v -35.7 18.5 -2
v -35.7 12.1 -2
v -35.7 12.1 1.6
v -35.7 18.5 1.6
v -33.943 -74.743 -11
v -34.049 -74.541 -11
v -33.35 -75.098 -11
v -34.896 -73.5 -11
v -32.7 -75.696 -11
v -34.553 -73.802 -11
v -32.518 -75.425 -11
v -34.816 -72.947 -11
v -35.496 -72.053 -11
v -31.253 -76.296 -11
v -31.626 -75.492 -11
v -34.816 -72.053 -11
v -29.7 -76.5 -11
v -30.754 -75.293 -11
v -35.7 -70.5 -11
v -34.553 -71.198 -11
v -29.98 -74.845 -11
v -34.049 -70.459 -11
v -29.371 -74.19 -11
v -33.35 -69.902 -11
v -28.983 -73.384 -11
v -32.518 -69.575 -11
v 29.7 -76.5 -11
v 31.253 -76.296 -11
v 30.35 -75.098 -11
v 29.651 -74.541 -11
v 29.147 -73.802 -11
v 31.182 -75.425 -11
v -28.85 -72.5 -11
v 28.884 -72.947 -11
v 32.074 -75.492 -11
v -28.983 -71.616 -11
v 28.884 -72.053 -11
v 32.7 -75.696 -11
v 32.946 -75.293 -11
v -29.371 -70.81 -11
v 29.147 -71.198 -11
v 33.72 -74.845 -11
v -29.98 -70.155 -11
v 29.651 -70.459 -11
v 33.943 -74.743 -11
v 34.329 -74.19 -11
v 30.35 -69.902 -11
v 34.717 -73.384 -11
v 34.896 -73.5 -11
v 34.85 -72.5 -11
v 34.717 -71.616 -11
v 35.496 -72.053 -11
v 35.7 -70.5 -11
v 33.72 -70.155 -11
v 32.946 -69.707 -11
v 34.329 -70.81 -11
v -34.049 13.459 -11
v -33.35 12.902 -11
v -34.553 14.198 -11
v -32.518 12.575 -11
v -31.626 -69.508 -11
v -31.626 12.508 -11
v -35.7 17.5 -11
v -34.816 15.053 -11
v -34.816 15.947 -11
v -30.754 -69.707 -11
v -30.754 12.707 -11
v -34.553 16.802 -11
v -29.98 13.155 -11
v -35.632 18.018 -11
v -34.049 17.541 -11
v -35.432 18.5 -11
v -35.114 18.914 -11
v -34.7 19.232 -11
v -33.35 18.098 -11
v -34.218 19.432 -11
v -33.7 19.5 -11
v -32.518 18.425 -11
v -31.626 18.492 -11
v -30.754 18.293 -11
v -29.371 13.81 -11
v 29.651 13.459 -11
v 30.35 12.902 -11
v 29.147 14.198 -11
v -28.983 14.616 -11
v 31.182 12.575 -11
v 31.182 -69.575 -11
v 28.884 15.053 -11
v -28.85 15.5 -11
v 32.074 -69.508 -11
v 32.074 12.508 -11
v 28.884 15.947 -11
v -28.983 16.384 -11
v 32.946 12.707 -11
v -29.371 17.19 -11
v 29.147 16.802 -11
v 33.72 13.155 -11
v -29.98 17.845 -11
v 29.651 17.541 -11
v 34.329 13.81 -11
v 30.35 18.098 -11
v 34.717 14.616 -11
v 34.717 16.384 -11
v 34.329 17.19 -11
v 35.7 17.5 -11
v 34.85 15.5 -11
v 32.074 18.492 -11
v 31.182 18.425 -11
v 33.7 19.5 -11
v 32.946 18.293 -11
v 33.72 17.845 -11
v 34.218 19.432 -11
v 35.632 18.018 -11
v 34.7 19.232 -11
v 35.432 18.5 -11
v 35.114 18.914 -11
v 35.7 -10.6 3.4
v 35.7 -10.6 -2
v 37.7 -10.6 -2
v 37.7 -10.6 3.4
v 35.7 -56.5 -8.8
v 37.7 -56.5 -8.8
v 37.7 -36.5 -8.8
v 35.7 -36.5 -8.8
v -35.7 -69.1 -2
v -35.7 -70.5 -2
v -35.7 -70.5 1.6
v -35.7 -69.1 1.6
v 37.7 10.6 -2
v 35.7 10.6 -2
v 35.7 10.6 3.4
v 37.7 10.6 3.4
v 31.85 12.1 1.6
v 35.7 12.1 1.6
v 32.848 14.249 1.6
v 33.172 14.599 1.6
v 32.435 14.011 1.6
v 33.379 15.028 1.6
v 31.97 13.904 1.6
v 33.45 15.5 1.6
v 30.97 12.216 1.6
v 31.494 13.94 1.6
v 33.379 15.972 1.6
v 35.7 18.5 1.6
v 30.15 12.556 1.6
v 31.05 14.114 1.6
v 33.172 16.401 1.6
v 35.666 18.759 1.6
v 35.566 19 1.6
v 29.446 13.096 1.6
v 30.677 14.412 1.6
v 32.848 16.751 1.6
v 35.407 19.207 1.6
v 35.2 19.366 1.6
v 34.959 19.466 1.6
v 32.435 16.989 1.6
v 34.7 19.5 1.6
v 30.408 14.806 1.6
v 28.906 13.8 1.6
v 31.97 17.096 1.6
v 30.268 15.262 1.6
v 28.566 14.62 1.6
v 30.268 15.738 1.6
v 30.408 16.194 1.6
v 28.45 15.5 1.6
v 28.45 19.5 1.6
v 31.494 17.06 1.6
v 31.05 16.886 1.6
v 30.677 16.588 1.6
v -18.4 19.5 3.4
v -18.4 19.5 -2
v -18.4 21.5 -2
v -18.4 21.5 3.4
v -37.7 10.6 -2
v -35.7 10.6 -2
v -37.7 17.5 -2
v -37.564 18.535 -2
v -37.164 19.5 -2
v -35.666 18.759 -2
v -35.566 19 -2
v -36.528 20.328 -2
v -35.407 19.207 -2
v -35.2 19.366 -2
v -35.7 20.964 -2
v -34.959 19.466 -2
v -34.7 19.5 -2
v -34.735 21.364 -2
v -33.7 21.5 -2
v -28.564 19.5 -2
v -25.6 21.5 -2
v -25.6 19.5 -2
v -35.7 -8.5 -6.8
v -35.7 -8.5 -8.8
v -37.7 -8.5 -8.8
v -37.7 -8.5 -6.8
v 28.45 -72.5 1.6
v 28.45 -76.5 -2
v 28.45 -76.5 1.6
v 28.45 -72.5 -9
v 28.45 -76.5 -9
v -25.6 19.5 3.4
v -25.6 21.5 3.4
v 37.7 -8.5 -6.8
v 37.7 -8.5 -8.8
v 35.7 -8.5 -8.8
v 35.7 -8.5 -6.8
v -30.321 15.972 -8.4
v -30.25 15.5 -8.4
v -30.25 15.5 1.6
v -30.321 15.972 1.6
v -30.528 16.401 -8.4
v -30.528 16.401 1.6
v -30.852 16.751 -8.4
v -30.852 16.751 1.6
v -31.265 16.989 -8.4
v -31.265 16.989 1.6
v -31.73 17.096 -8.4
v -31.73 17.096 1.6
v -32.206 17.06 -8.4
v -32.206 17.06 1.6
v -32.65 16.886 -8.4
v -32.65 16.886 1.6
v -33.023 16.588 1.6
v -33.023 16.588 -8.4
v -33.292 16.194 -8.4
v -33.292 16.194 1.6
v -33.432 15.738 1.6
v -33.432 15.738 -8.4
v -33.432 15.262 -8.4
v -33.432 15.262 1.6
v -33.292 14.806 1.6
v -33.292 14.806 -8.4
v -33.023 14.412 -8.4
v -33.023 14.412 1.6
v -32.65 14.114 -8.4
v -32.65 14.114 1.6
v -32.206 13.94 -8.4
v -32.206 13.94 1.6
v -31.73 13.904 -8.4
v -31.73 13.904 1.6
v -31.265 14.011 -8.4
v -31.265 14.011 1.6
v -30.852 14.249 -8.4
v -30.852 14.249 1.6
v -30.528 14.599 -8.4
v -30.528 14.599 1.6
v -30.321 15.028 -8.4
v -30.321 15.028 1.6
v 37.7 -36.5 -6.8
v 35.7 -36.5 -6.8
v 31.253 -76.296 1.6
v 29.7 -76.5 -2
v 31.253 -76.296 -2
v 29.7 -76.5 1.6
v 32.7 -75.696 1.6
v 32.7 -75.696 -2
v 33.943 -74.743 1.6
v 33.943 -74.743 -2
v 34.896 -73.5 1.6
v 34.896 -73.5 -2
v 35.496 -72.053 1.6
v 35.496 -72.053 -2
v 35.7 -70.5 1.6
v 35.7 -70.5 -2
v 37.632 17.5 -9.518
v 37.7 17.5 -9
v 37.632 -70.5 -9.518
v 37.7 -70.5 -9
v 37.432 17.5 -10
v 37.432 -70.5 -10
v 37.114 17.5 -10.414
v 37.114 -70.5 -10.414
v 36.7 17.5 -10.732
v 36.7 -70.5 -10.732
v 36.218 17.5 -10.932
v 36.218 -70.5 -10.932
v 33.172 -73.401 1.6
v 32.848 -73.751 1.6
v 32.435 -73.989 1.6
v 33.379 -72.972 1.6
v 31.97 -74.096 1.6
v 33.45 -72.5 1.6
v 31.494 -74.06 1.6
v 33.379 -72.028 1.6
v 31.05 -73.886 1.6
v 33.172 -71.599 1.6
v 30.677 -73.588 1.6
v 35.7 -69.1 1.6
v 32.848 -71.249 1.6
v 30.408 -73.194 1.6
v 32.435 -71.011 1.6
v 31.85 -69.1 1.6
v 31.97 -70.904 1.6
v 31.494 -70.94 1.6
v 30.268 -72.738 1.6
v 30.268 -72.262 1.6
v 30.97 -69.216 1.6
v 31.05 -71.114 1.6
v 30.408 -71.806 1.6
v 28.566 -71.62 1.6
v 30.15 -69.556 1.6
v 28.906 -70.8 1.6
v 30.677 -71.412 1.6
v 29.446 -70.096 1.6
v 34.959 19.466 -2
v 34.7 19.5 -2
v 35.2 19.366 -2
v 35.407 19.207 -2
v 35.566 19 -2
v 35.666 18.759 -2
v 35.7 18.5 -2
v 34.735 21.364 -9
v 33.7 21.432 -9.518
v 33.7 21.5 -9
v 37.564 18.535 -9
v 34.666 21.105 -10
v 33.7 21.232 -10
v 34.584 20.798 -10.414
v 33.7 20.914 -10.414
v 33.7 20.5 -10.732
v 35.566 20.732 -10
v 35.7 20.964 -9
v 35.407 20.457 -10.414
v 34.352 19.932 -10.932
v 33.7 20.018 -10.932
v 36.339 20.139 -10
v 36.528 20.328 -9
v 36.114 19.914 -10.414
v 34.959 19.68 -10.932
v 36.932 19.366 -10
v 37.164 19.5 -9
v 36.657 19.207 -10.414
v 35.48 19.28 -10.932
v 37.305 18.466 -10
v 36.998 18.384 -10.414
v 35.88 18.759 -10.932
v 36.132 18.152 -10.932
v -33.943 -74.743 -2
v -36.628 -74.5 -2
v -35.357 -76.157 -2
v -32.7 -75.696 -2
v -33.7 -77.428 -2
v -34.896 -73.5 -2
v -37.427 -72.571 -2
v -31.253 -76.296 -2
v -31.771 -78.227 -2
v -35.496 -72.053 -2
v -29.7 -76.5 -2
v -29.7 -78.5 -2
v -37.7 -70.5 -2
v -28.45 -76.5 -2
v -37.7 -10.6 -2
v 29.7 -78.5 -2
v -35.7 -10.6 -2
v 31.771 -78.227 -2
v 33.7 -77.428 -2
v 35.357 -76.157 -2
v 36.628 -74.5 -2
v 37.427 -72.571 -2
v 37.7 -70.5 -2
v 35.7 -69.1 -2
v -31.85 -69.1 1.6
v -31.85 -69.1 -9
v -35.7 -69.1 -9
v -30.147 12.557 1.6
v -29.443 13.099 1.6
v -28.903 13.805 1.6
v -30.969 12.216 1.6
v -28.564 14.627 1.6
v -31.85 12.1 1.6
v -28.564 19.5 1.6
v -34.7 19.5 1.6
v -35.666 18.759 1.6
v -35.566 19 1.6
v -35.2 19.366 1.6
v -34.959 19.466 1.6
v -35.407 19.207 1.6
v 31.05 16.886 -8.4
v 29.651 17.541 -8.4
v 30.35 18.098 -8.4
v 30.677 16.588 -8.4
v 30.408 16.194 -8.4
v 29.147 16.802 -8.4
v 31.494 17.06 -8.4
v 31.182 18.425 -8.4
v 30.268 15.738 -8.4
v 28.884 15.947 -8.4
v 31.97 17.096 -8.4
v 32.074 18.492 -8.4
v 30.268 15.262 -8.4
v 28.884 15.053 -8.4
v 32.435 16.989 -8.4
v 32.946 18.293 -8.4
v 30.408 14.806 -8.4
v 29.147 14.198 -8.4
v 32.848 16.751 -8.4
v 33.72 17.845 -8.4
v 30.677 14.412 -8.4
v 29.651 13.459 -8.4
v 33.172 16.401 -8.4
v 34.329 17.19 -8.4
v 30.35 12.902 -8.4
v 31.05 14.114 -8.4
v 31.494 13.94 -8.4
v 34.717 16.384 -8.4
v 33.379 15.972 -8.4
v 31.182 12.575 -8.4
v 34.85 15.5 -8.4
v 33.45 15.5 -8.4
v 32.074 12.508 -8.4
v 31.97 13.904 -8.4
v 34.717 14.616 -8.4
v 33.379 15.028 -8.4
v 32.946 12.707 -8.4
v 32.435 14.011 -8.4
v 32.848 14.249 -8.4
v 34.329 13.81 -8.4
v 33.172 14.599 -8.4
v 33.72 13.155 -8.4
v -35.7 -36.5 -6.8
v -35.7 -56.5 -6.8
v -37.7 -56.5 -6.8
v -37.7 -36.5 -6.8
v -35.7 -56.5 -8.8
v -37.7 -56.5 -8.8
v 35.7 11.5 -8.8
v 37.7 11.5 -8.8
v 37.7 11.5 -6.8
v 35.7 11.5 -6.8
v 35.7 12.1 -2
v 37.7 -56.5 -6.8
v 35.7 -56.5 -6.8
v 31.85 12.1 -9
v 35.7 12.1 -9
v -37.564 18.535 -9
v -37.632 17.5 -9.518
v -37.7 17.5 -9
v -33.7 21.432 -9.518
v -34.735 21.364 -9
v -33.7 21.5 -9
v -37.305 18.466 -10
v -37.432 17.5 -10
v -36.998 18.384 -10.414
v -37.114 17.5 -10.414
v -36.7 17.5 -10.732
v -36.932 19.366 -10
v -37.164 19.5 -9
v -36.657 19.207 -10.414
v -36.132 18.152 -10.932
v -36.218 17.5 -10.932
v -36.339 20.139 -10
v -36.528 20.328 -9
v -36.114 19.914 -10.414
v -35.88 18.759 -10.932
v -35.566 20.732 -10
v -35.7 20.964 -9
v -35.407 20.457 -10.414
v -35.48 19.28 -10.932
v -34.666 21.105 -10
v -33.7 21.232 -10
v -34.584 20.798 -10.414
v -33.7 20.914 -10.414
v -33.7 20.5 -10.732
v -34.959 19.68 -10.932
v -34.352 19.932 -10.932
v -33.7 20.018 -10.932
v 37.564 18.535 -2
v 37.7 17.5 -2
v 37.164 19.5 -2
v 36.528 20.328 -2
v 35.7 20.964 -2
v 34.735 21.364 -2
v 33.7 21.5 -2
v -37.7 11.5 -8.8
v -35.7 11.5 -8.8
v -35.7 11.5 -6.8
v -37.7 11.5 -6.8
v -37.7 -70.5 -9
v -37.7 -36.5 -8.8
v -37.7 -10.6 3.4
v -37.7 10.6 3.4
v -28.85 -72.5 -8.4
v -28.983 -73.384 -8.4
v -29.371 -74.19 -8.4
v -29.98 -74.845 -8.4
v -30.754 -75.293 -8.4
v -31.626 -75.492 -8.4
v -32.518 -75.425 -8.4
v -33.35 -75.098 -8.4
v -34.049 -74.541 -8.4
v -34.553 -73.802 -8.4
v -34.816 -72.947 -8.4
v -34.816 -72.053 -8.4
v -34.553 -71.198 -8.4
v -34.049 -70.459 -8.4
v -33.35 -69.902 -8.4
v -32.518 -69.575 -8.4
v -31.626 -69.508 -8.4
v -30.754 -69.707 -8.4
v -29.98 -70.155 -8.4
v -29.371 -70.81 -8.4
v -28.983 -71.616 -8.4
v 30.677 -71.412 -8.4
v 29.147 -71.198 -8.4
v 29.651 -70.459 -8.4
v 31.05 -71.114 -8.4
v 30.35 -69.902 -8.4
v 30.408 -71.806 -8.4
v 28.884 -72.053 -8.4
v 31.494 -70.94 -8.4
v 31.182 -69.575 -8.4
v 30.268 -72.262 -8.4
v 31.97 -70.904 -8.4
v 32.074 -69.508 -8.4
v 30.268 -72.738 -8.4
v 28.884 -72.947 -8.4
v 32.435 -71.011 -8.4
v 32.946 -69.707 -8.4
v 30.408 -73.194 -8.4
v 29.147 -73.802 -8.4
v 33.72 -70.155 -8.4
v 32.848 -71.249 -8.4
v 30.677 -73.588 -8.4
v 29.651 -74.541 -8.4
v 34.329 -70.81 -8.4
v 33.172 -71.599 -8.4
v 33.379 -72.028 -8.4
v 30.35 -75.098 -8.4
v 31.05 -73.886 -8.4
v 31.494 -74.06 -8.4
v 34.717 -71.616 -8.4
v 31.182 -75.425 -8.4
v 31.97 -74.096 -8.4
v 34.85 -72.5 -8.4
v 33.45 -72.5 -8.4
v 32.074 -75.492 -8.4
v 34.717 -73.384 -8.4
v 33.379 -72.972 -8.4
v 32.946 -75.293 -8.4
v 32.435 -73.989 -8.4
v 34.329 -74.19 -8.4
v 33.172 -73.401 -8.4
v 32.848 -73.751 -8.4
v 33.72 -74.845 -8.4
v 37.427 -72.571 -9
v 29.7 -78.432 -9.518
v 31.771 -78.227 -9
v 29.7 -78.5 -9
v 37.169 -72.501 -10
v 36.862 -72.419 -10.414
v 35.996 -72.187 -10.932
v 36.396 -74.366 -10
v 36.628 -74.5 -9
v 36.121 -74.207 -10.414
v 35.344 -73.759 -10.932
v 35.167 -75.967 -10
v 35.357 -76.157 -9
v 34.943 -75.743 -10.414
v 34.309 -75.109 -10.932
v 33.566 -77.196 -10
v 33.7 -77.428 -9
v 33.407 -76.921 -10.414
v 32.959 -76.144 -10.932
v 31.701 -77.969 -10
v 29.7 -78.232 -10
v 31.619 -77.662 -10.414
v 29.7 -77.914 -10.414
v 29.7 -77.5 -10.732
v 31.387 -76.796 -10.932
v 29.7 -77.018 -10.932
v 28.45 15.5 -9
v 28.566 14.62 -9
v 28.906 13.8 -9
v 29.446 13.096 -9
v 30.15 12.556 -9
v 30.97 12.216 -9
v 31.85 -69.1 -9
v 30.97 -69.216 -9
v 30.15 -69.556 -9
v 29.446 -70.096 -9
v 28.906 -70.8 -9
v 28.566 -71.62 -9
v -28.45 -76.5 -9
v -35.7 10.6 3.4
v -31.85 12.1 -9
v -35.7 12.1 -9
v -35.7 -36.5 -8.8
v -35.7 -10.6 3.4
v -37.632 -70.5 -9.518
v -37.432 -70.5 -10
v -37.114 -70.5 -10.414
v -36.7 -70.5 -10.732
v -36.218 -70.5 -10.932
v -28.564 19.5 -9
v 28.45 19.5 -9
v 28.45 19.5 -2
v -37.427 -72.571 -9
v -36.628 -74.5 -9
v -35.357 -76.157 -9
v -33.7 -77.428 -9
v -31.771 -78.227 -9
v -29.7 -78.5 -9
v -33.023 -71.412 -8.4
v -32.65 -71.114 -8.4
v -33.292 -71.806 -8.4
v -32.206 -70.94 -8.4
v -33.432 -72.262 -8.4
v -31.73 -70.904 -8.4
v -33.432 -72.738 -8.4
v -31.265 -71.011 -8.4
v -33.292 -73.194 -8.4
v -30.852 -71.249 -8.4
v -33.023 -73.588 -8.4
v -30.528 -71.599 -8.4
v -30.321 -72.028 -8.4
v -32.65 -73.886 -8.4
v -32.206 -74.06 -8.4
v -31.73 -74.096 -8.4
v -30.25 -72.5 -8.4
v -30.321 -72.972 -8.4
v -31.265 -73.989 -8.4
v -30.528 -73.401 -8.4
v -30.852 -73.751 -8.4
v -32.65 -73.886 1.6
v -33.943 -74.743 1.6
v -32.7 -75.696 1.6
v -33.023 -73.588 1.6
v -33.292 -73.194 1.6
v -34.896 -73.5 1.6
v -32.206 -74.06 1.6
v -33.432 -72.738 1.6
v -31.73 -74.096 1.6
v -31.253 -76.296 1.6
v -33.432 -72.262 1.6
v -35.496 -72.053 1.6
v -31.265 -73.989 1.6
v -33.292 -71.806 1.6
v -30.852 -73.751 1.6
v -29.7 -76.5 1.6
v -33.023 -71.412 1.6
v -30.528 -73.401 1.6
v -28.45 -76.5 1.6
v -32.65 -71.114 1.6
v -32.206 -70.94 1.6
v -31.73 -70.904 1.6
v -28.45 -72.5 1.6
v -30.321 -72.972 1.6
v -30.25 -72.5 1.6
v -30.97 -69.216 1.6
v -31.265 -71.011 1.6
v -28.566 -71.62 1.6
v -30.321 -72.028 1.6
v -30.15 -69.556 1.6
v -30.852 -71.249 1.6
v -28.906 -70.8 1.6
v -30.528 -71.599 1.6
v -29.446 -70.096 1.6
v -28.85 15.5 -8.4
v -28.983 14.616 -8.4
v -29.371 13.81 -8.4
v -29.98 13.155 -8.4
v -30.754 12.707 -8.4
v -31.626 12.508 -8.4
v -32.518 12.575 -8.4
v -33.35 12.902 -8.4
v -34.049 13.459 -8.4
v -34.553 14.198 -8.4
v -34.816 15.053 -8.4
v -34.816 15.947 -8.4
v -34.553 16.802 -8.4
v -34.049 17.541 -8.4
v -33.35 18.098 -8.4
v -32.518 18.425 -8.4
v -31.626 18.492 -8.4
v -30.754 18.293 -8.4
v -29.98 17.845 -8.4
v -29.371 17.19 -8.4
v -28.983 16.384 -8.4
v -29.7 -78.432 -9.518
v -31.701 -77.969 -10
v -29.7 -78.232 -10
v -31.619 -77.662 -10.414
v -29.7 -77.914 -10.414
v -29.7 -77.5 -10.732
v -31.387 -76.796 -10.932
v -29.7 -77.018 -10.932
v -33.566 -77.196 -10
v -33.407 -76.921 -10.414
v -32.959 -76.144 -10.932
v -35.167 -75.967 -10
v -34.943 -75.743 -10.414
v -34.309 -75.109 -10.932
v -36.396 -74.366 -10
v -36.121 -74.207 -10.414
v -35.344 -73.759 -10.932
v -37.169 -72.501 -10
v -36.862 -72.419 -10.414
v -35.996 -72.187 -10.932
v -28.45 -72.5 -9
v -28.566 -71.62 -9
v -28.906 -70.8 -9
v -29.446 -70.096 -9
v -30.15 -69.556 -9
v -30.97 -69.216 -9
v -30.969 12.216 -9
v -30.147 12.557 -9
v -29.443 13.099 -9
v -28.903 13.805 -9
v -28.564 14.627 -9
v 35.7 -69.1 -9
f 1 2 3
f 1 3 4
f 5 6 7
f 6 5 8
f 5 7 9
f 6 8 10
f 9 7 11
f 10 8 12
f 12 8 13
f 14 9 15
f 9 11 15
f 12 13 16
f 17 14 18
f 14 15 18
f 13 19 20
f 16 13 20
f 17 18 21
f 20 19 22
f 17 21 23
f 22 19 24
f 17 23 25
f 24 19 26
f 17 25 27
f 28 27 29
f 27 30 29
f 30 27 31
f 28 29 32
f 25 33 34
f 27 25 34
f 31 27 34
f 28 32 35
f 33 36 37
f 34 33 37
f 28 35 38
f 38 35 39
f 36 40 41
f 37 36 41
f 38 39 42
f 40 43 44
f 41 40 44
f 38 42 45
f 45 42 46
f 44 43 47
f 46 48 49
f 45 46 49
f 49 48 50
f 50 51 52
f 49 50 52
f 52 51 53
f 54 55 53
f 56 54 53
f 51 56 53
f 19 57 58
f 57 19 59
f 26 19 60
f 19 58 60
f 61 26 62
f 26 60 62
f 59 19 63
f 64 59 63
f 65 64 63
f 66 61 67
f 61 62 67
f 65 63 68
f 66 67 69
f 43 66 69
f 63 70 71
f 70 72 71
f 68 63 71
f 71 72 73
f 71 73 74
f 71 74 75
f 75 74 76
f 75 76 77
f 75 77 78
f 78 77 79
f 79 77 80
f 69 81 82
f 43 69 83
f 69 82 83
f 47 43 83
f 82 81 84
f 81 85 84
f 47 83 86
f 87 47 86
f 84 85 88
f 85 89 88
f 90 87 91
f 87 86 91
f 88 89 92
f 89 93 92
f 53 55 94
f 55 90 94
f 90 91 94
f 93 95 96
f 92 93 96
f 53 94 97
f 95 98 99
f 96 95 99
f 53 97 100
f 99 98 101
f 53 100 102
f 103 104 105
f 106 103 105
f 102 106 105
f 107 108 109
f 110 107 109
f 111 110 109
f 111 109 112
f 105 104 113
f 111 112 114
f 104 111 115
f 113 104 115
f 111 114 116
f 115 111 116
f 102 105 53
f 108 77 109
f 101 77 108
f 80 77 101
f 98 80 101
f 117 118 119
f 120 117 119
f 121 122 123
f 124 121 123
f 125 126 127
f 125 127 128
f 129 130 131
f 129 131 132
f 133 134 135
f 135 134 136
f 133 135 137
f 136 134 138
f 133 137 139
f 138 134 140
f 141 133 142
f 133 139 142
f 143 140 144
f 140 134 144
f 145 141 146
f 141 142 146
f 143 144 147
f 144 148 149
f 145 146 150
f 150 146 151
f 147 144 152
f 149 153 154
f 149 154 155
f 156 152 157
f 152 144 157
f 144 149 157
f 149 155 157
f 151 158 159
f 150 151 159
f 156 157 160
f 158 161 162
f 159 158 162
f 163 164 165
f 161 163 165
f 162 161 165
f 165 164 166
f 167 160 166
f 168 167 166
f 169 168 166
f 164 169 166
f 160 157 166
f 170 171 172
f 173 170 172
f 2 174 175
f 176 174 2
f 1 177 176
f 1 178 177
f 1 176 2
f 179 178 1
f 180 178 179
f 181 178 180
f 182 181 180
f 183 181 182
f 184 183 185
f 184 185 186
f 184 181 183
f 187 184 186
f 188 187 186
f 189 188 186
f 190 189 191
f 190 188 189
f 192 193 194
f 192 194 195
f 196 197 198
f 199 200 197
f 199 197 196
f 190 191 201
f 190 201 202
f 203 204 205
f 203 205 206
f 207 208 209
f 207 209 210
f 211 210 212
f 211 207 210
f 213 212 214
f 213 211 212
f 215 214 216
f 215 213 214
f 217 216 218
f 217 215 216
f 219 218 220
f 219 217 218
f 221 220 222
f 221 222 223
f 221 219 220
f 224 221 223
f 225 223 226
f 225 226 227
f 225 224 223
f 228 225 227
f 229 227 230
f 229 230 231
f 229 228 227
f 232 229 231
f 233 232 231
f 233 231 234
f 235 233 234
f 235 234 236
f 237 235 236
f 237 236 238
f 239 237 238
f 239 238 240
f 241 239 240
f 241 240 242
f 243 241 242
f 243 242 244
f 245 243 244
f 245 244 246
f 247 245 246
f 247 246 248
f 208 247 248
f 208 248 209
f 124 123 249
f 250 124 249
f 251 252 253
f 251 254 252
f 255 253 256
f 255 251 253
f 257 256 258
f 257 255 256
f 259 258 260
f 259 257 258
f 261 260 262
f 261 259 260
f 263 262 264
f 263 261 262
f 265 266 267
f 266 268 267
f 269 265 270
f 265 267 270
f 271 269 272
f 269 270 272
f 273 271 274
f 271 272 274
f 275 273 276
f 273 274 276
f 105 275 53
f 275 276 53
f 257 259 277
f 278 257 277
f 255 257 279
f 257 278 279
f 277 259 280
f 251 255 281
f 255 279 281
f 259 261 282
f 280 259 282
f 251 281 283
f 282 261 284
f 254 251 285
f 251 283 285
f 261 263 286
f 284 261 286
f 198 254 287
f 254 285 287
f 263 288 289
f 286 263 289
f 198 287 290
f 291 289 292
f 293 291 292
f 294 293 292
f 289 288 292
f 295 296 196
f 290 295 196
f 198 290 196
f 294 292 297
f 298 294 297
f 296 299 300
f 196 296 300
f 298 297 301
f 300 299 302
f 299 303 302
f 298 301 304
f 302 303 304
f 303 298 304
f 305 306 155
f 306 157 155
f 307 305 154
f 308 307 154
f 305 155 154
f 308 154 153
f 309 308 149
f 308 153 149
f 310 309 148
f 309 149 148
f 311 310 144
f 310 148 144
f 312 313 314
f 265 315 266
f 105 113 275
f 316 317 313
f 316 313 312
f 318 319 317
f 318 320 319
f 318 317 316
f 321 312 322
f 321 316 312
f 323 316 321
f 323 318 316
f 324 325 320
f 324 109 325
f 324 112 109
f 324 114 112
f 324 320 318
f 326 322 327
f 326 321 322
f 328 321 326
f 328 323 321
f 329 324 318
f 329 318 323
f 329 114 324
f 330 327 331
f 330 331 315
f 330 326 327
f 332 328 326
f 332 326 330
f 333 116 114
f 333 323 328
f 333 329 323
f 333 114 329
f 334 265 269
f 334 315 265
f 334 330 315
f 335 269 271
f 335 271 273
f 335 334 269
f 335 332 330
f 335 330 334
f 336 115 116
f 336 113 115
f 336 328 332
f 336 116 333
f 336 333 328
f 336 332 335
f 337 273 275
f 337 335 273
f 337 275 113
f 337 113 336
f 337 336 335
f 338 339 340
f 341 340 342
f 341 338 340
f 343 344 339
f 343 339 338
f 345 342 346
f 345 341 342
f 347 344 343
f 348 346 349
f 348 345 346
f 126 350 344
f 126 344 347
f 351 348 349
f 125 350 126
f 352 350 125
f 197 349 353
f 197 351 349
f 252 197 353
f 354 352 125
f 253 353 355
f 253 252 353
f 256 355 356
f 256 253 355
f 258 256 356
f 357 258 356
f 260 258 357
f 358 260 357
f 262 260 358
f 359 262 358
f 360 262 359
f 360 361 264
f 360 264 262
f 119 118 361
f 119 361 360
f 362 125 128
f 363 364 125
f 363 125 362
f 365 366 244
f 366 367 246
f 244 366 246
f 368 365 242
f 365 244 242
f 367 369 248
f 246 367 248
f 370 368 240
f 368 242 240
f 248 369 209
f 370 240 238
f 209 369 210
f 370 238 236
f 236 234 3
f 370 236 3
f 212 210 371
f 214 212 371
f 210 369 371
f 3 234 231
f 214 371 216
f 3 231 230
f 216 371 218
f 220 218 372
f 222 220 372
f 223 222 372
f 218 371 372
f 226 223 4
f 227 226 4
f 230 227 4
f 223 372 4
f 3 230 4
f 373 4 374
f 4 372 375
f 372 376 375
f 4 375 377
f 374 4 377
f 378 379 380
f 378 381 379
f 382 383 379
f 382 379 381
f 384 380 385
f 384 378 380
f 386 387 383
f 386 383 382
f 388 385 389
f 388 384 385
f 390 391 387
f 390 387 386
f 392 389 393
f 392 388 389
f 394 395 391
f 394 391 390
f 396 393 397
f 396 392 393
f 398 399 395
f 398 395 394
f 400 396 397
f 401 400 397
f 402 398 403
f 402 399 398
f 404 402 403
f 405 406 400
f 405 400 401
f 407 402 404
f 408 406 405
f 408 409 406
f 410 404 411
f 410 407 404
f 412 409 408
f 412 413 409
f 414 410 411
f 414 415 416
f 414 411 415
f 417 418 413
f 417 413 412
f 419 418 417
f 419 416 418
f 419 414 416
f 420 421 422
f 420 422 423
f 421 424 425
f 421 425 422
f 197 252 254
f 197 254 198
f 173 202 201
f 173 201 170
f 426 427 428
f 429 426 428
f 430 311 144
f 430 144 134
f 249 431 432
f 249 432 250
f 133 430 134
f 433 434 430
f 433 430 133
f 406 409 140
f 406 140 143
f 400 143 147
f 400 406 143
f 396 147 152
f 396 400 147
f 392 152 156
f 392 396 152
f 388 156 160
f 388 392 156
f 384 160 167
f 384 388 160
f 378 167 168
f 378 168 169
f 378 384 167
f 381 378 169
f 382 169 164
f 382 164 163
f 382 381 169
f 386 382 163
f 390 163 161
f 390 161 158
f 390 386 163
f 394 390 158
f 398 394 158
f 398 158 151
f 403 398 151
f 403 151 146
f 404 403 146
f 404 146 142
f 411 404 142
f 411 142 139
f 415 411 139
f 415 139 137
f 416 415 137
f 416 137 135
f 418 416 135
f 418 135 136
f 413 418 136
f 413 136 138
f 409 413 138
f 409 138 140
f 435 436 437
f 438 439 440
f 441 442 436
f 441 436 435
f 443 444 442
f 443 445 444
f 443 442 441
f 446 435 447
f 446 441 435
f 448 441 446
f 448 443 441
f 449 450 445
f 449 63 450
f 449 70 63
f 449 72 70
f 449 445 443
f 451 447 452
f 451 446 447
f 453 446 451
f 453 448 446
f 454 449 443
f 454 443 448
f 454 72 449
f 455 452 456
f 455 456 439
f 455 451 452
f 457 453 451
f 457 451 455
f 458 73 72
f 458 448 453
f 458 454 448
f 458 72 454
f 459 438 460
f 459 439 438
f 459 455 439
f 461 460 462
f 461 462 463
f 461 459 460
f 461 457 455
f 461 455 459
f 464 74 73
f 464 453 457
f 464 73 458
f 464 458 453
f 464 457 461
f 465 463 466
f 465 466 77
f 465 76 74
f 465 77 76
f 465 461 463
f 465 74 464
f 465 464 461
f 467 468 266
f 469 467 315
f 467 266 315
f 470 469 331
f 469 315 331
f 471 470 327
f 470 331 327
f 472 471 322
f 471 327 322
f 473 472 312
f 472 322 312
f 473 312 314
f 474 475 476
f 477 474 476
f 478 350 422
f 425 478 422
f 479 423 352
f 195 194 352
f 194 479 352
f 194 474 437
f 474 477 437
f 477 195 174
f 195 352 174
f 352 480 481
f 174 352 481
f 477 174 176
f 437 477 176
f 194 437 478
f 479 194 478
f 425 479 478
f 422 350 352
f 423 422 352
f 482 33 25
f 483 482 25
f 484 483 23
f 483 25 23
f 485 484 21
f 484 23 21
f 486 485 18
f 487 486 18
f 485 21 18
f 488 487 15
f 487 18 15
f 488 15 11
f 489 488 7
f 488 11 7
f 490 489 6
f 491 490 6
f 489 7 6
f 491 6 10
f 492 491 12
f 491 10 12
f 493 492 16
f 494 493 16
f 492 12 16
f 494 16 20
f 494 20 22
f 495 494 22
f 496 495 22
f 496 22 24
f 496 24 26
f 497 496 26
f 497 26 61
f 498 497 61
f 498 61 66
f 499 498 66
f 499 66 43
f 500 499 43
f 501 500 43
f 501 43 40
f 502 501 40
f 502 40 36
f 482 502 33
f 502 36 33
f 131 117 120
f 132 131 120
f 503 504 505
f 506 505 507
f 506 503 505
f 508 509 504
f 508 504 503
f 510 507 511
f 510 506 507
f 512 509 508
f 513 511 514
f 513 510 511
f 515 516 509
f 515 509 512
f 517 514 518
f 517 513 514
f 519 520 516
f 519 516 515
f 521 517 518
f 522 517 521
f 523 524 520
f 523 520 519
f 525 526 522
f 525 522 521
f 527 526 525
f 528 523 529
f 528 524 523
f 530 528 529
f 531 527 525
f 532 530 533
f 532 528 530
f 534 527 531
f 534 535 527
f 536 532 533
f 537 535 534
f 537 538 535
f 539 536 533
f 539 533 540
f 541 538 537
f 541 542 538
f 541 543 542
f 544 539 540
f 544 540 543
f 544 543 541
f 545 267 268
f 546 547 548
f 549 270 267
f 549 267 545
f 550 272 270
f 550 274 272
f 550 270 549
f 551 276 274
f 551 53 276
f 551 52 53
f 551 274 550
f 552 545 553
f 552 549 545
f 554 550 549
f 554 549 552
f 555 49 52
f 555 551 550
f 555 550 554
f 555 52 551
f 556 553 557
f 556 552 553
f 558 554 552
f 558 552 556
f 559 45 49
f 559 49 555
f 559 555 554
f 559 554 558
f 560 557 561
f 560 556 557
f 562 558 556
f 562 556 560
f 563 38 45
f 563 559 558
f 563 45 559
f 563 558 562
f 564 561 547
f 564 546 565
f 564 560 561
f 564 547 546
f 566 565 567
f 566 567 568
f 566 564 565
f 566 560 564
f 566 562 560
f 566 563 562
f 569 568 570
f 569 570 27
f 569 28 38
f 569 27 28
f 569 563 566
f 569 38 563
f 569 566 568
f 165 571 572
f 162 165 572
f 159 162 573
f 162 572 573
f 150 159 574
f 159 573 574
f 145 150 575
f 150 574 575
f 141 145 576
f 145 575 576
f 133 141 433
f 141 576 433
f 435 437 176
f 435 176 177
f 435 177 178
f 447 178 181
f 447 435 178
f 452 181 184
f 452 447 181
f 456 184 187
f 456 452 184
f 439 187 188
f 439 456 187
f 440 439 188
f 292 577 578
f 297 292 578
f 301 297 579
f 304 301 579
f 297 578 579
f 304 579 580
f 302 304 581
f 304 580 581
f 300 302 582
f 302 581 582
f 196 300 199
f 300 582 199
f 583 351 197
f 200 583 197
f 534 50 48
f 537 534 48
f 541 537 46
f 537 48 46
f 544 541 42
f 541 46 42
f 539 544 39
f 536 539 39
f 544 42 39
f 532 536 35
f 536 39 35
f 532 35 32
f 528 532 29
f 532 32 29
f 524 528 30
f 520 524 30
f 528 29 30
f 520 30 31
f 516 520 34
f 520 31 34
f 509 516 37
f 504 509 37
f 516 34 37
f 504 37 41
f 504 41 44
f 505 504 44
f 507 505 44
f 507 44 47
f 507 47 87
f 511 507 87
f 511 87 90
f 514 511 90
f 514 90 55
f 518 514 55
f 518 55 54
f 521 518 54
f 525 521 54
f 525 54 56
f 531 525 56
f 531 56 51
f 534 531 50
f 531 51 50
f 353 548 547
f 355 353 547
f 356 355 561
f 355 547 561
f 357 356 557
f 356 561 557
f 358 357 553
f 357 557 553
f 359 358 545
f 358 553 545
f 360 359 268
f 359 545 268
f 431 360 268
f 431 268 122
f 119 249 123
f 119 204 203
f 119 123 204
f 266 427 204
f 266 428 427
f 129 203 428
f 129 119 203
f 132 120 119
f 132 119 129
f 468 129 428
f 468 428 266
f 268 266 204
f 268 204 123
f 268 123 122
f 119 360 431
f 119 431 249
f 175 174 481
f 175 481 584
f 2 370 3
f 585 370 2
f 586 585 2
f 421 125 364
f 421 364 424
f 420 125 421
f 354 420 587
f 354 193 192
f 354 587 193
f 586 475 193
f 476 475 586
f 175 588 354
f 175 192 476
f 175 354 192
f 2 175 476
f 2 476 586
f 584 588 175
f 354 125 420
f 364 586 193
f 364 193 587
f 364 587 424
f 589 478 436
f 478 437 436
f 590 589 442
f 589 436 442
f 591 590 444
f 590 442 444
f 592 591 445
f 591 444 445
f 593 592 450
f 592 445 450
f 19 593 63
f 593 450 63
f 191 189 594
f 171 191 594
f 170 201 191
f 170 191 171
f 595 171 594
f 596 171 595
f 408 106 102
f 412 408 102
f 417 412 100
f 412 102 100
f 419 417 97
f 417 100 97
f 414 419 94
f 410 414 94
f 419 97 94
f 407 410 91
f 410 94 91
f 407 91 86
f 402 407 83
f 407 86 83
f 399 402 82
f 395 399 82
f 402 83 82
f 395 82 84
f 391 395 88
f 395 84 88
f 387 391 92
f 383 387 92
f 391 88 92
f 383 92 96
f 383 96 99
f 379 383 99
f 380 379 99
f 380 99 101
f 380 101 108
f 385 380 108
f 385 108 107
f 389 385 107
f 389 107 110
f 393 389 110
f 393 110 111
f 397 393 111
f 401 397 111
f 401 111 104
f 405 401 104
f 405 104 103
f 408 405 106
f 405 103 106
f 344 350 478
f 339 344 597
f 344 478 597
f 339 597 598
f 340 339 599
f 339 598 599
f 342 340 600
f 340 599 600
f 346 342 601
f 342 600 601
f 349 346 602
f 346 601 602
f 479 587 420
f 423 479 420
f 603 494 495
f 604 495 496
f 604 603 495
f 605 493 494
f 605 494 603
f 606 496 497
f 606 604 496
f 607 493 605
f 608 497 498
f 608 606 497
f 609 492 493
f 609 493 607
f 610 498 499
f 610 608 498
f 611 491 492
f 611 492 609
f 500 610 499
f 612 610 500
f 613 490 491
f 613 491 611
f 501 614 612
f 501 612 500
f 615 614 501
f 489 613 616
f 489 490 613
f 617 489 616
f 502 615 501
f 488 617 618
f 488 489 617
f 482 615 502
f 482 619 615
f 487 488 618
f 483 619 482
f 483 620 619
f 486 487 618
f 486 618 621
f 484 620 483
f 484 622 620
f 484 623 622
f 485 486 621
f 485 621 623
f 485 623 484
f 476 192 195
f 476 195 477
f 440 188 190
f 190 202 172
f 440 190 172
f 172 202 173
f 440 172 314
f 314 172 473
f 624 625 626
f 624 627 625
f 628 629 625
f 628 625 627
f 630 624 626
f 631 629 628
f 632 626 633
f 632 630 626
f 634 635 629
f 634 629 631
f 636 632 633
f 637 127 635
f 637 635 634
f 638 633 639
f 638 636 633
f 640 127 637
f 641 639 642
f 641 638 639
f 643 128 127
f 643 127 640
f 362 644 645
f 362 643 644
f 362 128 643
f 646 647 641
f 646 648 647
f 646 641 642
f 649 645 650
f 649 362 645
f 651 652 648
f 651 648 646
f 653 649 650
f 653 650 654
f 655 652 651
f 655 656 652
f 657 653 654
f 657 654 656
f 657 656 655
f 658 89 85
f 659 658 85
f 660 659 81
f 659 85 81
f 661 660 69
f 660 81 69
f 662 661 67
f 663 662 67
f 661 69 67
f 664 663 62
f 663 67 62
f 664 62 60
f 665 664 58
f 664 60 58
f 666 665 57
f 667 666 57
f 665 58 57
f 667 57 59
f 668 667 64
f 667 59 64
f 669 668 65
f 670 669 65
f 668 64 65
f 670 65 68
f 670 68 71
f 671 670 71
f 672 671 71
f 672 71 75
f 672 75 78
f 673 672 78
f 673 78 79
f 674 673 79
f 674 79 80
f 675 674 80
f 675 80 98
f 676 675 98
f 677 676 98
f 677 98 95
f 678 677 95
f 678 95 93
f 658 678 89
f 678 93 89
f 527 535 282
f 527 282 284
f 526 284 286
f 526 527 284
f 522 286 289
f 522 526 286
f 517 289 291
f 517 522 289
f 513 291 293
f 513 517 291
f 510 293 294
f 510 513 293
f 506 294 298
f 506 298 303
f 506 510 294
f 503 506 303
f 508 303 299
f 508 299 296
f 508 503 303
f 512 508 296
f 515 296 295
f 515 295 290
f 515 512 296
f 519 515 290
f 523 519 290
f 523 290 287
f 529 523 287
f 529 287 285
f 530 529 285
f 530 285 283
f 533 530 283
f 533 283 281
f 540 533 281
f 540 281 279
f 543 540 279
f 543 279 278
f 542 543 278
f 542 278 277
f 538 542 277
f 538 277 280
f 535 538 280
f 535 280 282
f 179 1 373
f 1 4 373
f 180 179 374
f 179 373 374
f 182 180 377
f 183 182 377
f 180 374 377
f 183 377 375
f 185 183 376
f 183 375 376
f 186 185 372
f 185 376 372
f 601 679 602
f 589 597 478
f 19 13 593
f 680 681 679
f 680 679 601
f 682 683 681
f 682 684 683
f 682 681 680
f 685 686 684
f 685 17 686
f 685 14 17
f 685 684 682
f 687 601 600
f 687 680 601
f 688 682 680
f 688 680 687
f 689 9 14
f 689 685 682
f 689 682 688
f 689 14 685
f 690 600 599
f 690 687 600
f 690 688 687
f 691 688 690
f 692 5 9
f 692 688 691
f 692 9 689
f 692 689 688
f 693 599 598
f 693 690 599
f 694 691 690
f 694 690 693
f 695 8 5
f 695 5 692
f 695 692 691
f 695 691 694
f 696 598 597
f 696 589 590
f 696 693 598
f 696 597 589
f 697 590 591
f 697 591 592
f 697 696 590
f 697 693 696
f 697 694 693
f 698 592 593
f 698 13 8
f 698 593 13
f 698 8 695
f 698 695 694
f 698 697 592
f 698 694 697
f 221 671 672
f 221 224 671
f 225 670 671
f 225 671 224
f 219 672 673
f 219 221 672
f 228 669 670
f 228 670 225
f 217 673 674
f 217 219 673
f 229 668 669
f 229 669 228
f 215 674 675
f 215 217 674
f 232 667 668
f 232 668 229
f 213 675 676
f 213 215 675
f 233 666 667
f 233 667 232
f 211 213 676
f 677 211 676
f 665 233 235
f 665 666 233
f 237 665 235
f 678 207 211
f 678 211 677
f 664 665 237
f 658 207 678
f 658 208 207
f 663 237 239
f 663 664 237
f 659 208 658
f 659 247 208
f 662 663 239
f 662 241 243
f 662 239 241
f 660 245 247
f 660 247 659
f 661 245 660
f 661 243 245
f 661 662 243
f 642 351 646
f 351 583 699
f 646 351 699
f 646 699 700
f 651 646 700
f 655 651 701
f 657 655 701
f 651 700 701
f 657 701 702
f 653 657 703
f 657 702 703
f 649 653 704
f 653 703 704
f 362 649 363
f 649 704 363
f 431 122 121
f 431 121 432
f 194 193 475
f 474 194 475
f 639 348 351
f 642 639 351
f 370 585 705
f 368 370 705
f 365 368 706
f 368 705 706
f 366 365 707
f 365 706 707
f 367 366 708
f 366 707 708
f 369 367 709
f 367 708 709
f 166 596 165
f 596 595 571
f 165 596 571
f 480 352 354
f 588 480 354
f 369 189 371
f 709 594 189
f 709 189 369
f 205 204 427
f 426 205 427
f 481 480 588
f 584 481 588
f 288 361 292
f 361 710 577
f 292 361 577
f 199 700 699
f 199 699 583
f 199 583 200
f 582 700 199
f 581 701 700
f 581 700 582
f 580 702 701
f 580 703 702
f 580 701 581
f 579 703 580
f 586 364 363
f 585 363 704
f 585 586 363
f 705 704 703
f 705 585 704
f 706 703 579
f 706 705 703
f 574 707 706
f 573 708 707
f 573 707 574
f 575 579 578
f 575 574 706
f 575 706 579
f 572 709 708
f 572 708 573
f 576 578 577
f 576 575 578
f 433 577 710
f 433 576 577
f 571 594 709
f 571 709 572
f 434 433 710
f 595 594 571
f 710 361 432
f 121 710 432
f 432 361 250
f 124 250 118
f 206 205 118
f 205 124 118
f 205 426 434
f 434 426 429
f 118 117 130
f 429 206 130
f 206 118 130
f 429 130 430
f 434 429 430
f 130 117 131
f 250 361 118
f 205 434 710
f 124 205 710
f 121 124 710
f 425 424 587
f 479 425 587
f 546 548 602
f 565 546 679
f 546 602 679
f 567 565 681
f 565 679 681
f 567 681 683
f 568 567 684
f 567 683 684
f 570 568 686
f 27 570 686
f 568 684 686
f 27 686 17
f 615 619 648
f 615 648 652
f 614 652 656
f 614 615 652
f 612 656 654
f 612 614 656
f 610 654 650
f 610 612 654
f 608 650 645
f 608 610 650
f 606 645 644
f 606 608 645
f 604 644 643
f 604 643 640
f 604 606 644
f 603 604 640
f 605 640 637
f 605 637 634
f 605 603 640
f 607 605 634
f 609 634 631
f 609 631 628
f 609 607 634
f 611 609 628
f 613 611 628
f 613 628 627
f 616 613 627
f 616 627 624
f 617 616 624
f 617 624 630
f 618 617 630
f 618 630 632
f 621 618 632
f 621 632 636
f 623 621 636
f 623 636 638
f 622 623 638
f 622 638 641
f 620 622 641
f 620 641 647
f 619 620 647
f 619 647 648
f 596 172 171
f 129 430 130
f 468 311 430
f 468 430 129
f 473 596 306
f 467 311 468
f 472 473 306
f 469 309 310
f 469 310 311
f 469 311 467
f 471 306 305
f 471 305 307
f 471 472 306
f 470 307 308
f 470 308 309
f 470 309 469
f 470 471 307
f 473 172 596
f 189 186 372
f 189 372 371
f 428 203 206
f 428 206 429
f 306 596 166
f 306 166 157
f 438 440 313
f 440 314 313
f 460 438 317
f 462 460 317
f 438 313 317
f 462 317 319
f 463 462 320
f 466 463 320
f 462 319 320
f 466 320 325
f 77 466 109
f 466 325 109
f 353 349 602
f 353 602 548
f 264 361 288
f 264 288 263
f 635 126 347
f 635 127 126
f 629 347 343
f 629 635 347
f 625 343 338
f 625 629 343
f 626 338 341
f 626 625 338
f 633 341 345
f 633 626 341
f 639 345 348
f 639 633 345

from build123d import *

# Parameters (mm, degrees)
SKETCH014_W     = 75.4
SKETCH014_H     = 100
PAD008_DEPTH    = 9
SKETCH015_W     = 71.4
SKETCH015_H     = 96
POCKET006_DEPTH = 7
SKETCH016_W     = 2
SKETCH016_H     = 21.2
SKETCH016_W_2   = 7.2
SKETCH016_H_2   = 2
PAD009_DEPTH    = 5.4
SKETCH017_W     = 20
SKETCH017_H     = 2
POCKET007_DEPTH = 75.401
SKETCH018_R     = 1.6
PAD010_DEPTH    = 10.6
SKETCH019_R     = 3
POCKET008_DEPTH = 2.6
FILLET006_R     = 1
FILLET007_R     = 6
FILLET008_R     = 4
FILLET009_R     = 8
FILLET010_R     = 2


with BuildPart() as part:
    # Sketch014 → Pad008 (new body)
    with BuildSketch(Plane.XY):
        with Locations((0, -28.5)):
            Rectangle(SKETCH014_W, SKETCH014_H)
    extrude(amount=-PAD008_DEPTH)

    # Sketch015 (on Face5 of Pad008) → Pocket006 (cut)
    with BuildSketch(Plane.XY):
        with Locations((0, -28.5)):
            Rectangle(SKETCH015_W, SKETCH015_H)
    extrude(amount=-POCKET006_DEPTH, mode=Mode.SUBTRACT)

    # Sketch016 (on Face4 of Pocket006) → Pad009 (join)
    with BuildSketch(Plane.XY):
        with Locations((-36.7, 0)):
            Rectangle(SKETCH016_W, SKETCH016_H)
        with Locations((36.7, 0)):
            Rectangle(SKETCH016_W, SKETCH016_H)
        with Locations((-22, 20.5)):
            Rectangle(SKETCH016_W_2, SKETCH016_H_2)
    extrude(amount=PAD009_DEPTH)

    # Sketch017 (on Face3 of Pad009) → Pocket007 (cut, through all)
    with BuildSketch(Plane.YZ.offset(37.7)):
        with Locations((-46.5, -5.8)):
            Rectangle(SKETCH017_W, SKETCH017_H)
        with Locations((1.5, -5.8)):
            Rectangle(SKETCH017_W, SKETCH017_H)
    extrude(amount=-POCKET007_DEPTH, mode=Mode.SUBTRACT)

    # Sketch018 (on Face42 of Pocket007) → Pad010 (join)
    with BuildSketch(Plane.XY.offset(-7)):
        with BuildLine():
            Line((-31.85, 12.1), (-35.7, 12.1))
            Line((-35.7, 12.1), (-35.7, 19.5))
            Line((-35.7, 19.5), (-28.563923, 19.5))
            Line((-28.563923, 19.5), (-28.563923, 14.627247))
            ThreePointArc((-31.85, 12.1), (-29.777243, 12.804879), (-28.563923, 14.627247))
        make_face()
        with Locations((-31.85, 15.5)):
            Circle(SKETCH018_R, mode=Mode.SUBTRACT)
        with BuildLine():
            Line((28.45, 19.5), (35.7, 19.5))
            Line((35.7, 19.5), (35.7, 12.1))
            Line((35.7, 12.1), (31.85, 12.1))
            ThreePointArc((28.45, 15.5), (29.445837, 13.095837), (31.85, 12.1))
            Line((28.45, 19.5), (28.45, 15.5))
        make_face()
        with Locations((31.85, 15.5)):
            Circle(SKETCH018_R, mode=Mode.SUBTRACT)
        with BuildLine():
            Line((35.7, -69.1), (35.7, -76.5))
            Line((35.7, -76.5), (28.45, -76.5))
            Line((28.45, -76.5), (28.45, -72.5))
            ThreePointArc((31.85, -69.1), (29.445837, -70.095837), (28.45, -72.5))
            Line((35.7, -69.1), (31.85, -69.1))
        make_face()
        with Locations((31.85, -72.5)):
            Circle(SKETCH018_R, mode=Mode.SUBTRACT)
        with BuildLine():
            Line((-35.7, -76.5), (-28.45, -76.5))
            Line((-28.45, -76.5), (-28.45, -72.5))
            ThreePointArc((-28.45, -72.5), (-29.445837, -70.095837), (-31.85, -69.1))
            Line((-35.7, -69.1), (-31.85, -69.1))
            Line((-35.7, -76.5), (-35.7, -69.1))
        make_face()
        with Locations((-31.85, -72.5)):
            Circle(SKETCH018_R, mode=Mode.SUBTRACT)
    extrude(amount=PAD010_DEPTH)

    # Sketch019 (on Face7 of Pad010) → Pocket008 (cut)
    with BuildSketch(Plane(origin=(0, 0, -9), x_dir=(1, 0, 0), z_dir=(0, 0, -1))):
        with Locations((-31.85, 72.5)):
            Circle(SKETCH019_R)
        with Locations((31.85, 72.5)):
            Circle(SKETCH019_R)
        with Locations((-31.85, -15.5)):
            Circle(SKETCH019_R)
        with Locations((31.85, -15.5)):
            Circle(SKETCH019_R)
    extrude(amount=-POCKET008_DEPTH, mode=Mode.SUBTRACT)

    # Fillet006
    fillet006_edges = [part.edges().sort_by_distance(p)[0] for p in [
        (-35.7, 19.5, 1.8),
        (35.7, 19.5, 1.8),
    ]]
    fillet(fillet006_edges, radius=FILLET006_R)

    # Fillet007
    fillet007_edges = [part.edges().sort_by_distance(p)[0] for p in [
        (35.7, -76.5, 1.8),
        (-35.7, -76.5, 1.8),
    ]]
    fillet(fillet007_edges, radius=FILLET007_R)

    # Fillet008
    fillet008_edges = [part.edges().sort_by_distance(p)[0] for p in [
        (-37.7, 21.5, -4.5),
        (37.7, 21.5, -4.5),
    ]]
    fillet(fillet008_edges, radius=FILLET008_R)

    # Fillet009
    fillet009_edges = [part.edges().sort_by_distance(p)[0] for p in [
        (-37.7, -78.5, -4.5),
        (37.7, -78.5, -4.5),
    ]]
    fillet(fillet009_edges, radius=FILLET009_R)

    # Fillet010
    fillet010_edges = [part.edges().sort_by_distance(p)[0] for p in [
        (-37.7, -26.5, -9),
        (-36.528427, 20.328427, -9),
        (0, 21.5, -9),
        (36.528427, 20.328427, -9),
        (37.7, -26.5, -9),
        (35.356854, -76.156854, -9),
        (0, -78.5, -9),
        (-35.356854, -76.156854, -9),
    ]]
    fillet(fillet010_edges, radius=FILLET010_R)


with BuildPart() as part_1:
    # Body004 placement: moved
    add(part.part.moved(Location((0, 0, -2))))


solid = part_1.part
